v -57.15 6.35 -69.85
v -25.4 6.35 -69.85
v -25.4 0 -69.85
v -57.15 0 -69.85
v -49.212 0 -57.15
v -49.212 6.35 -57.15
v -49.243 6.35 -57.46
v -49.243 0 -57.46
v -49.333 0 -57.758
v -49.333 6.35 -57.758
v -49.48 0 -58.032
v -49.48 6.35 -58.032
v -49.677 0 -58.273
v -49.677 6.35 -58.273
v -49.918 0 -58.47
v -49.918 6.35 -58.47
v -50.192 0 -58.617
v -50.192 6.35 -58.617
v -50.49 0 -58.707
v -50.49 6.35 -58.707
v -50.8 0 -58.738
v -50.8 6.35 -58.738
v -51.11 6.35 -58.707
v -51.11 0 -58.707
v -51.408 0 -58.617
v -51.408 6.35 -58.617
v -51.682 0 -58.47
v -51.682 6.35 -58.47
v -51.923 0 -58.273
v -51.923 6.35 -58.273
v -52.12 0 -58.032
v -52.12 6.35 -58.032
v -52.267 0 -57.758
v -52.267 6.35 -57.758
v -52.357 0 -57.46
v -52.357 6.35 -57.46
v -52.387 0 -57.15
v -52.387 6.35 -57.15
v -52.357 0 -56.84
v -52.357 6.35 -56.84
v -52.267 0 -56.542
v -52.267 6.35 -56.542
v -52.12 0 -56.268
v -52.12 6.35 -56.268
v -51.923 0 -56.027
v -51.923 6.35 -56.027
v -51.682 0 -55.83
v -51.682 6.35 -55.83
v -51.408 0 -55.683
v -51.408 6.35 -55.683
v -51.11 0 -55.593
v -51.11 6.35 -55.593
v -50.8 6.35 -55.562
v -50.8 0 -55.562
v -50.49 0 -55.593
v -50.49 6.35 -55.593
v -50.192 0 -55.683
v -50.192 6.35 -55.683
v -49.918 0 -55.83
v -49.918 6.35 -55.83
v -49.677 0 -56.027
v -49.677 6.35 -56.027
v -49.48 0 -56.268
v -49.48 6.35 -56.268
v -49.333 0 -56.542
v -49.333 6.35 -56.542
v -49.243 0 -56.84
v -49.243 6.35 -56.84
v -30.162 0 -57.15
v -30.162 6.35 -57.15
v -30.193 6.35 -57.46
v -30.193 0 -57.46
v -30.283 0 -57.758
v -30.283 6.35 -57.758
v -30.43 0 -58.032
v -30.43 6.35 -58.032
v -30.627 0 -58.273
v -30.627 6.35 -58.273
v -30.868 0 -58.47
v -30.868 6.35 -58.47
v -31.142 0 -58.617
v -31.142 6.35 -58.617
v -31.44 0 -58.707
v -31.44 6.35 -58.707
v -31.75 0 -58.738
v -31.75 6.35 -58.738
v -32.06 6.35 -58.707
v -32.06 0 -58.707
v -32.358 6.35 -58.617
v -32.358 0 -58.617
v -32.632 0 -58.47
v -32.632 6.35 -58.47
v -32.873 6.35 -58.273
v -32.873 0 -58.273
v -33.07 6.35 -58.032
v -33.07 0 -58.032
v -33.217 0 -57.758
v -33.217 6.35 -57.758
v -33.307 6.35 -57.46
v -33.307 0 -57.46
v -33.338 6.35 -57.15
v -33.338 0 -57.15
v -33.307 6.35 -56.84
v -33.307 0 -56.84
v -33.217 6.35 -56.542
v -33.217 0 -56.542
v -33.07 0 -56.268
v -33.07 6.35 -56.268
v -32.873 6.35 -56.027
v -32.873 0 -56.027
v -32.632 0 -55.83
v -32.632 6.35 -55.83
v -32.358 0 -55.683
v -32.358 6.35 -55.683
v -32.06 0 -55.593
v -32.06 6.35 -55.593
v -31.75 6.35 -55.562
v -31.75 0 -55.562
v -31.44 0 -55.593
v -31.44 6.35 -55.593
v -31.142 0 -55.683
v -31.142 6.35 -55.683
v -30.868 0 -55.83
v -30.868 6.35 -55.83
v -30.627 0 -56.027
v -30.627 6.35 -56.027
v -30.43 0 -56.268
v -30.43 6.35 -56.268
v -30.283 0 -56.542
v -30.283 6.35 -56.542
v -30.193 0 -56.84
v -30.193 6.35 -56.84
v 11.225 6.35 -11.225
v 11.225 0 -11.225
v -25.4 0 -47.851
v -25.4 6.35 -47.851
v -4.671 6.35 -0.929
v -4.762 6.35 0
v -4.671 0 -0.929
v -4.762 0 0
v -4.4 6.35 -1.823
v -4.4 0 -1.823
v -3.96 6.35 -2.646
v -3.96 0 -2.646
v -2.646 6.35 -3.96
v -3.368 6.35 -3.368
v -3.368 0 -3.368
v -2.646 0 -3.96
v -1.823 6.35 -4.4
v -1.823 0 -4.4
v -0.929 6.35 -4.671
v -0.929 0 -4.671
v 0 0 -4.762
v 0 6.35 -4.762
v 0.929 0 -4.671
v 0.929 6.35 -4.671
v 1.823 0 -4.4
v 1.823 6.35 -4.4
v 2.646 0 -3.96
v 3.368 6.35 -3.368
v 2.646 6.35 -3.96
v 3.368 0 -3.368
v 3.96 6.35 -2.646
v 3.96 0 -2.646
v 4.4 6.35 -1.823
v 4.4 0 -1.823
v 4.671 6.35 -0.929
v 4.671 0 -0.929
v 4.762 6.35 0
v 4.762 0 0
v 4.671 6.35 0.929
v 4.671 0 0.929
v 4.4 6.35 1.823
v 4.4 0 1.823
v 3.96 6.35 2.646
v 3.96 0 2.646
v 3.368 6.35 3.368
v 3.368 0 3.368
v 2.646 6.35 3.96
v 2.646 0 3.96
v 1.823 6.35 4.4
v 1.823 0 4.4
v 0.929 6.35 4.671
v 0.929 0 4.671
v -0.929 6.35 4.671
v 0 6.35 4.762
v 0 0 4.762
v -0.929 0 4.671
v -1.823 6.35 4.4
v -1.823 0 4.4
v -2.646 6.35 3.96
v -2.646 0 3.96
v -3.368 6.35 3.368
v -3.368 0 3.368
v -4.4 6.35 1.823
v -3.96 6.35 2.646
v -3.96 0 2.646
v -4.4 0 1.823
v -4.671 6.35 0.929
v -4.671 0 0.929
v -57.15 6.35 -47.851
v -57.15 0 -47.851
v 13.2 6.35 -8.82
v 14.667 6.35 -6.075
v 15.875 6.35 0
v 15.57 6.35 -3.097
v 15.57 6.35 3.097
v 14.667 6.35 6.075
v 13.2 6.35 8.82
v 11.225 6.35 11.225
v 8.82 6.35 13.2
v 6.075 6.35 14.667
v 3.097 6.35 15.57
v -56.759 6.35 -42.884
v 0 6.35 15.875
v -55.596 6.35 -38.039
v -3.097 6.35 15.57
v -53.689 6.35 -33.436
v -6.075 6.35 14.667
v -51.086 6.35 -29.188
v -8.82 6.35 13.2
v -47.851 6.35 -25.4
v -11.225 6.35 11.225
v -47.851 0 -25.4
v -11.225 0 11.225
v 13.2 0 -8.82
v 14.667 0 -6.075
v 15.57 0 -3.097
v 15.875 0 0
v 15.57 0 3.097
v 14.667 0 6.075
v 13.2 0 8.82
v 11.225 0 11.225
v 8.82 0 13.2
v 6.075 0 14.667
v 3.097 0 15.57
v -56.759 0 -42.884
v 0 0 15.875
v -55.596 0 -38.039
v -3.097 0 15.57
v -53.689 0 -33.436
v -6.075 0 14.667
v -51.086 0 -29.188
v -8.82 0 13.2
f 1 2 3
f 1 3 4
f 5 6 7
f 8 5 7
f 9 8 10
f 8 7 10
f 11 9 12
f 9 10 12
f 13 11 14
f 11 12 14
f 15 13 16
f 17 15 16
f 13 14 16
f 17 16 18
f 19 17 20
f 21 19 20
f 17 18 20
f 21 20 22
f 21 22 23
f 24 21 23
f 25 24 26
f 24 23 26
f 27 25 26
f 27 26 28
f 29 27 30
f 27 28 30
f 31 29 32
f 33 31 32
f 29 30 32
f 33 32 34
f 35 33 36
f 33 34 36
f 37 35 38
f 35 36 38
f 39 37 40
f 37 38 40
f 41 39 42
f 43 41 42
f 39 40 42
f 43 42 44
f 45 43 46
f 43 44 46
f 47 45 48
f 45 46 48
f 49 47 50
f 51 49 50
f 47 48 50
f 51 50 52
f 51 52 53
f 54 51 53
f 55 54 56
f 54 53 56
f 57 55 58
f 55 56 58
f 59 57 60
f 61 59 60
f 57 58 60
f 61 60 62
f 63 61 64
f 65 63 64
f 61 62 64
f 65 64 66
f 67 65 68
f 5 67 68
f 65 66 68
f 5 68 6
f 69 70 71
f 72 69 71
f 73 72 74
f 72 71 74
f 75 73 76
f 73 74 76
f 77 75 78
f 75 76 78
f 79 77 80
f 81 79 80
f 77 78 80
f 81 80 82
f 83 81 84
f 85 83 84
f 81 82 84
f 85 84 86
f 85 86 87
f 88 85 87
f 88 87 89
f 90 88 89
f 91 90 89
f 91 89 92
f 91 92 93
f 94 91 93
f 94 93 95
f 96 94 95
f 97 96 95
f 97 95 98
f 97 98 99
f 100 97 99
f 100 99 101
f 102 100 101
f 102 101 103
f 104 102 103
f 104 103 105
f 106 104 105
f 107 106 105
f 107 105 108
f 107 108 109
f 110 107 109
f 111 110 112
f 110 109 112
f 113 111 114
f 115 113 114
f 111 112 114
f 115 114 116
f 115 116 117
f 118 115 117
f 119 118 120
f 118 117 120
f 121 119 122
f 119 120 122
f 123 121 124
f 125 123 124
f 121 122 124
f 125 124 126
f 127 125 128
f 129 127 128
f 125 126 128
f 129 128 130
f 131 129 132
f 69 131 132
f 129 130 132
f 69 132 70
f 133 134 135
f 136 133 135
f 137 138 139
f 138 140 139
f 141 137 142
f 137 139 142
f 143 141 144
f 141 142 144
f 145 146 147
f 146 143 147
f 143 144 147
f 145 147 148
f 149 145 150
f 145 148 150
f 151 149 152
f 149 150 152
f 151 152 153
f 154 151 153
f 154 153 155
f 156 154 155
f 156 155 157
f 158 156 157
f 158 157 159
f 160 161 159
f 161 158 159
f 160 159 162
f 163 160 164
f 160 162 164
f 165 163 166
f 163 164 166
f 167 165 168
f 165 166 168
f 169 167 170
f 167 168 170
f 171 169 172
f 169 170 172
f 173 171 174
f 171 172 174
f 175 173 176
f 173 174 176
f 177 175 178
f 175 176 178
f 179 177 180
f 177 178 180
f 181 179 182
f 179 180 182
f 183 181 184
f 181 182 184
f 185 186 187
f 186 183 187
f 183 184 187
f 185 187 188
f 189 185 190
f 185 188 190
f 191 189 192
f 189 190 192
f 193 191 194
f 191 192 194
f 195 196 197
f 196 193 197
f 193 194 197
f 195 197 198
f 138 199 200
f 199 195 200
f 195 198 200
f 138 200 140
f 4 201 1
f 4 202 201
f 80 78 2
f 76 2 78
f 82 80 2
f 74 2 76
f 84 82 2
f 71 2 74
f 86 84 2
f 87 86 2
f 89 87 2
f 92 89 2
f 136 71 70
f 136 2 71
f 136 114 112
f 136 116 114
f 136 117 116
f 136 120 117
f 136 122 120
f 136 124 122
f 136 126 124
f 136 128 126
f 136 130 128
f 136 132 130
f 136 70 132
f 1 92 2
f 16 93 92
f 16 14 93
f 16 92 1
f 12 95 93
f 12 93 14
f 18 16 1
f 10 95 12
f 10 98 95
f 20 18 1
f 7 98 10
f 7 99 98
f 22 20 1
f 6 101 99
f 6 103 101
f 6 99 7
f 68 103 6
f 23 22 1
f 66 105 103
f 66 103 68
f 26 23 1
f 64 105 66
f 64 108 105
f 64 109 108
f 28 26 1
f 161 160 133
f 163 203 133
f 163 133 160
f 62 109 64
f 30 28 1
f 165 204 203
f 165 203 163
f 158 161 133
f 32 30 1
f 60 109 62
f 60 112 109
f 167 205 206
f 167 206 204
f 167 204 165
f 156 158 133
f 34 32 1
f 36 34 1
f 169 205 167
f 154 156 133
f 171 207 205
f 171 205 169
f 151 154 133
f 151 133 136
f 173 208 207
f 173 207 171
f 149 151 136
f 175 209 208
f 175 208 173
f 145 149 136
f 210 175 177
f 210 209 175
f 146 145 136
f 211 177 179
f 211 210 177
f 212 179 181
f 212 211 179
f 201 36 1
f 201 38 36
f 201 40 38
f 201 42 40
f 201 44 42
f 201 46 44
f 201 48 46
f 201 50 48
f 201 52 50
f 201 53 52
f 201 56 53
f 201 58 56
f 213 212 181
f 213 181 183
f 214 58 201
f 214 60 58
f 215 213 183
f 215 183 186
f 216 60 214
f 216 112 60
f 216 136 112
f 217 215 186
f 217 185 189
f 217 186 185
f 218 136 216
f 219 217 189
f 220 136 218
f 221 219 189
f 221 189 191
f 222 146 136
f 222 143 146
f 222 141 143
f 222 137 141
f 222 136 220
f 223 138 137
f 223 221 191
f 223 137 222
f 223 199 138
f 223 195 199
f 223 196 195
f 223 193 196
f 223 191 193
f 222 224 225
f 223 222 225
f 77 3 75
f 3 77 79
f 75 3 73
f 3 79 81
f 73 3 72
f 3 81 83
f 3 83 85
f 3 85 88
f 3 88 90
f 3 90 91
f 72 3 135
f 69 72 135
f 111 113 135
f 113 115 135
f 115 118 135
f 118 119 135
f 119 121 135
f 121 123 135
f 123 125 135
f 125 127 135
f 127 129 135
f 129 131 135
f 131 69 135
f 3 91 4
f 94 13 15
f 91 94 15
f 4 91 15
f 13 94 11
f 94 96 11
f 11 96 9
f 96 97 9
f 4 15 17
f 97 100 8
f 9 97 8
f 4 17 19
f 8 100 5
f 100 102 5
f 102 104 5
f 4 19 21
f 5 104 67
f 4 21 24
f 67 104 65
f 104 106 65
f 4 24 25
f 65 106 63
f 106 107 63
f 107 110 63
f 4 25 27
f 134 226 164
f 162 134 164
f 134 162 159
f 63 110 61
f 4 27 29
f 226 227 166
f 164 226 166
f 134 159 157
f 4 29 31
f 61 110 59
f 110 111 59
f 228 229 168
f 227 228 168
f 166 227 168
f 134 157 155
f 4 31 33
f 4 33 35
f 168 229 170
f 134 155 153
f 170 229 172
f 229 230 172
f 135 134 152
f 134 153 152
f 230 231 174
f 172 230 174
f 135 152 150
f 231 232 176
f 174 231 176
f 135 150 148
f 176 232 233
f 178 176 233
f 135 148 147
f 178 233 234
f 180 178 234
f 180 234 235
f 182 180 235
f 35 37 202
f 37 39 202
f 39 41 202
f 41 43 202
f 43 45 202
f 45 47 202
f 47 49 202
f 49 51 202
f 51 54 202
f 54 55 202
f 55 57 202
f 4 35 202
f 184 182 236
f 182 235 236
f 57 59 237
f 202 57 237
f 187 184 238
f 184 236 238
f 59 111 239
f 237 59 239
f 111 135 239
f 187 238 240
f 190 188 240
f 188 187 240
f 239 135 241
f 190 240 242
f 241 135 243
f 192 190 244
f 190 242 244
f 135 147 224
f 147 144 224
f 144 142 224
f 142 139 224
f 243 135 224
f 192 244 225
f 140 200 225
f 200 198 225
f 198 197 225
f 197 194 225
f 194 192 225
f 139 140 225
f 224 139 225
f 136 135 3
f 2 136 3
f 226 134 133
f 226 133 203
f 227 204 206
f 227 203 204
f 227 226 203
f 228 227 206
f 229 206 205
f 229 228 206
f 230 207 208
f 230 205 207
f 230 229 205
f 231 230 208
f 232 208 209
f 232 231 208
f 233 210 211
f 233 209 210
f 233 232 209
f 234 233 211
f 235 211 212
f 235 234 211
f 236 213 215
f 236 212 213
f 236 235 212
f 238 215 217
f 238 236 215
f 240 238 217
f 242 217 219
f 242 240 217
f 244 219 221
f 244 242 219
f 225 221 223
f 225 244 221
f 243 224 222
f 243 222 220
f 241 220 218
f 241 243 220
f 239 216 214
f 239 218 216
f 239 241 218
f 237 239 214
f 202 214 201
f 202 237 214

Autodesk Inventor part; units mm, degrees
ref_plane "YZ Plane" through (0, 0, 0) normal (1, 0, 0) x (0, 1, 0)
ref_plane "XZ Plane" through (0, 0, 0) normal (0, 1, 0) x (-1, 0, 0)
ref_plane "XY Plane" through (0, 0, 0) normal (0, 0, 1) x (1, 0, 0)
sketch "Sketch1" plane through (0, 0, 0) normal (0, 1, 0) x (-1, 0, 0)
  circle A0 centre (0, 0) radius 4.7625
  line L0 (0, -228.6) -> (0, 0) construction
  line L1 (15.875, -228.6) -> (0, -228.6) construction
  circle A1 centre (15.875, -228.6) radius 7.9375
  line L2 (25.4, -47.8506) -> (25.4, -212.725)
  line L3 (57.15, -47.8506) -> (57.15, -212.725)
  line L4 (25.4, -212.725) -> (15.875, -212.725)
  arc A2 (15.875, -212.725) -> (15.875, -244.475) centre (15.875, -228.6) ccw
  line L5 (15.875, -244.475) -> (25.4, -244.475)
  arc A3 (25.4, -244.475) -> (57.15, -212.725) centre (25.4, -212.725) ccw
  line L6 (57.15, -130.2878) -> (25.4, -130.2878) construction
  arc A4 (11.2253, 11.2253) -> (-11.2253, -11.2253) centre (0, 0) ccw
  line L7 (-11.2253, -11.2253) -> (25.4, -47.8506)
  arc A5 (57.15, -47.8506) -> (47.8506, -25.4) centre (25.4, -47.8506) ccw
  line L8 (47.8506, -25.4) -> (11.2253, 11.2253)
  line L9 (41.275, -130.2878) -> (41.275, -240.2213) construction
  line L10 (41.275, -130.2878) -> (41.275, -18.8244) construction
  dimension "d0" = 9.525
  dimension "d2" = 228.6
  dimension "d7" = 15.875
  dimension "d17" = 31.75
  dimension "d18" = 45
  dimension "d19" = 25.4
  dimension "d20" = 25.4
extrude "Extrusion1" add sketch "Sketch1" along normal blind 6.35
sketch "Sketch2" plane through (0, 6.35, 0) normal (0, 1, 0) x (1, 0, 0)
  line L0 (-69.0057, 276.0917) -> (22.485, 276.0917)
  line L1 (22.485, 276.0917) -> (22.485, 69.85)
  line L2 (22.485, 69.85) -> (-69.0057, 69.85)
  line L3 (-69.0057, 69.85) -> (-69.0057, 276.0917)
  point P0 (0, 0)
  dimension "d21" = 69.85
extrude "Extrusion2" cut sketch "Sketch2" against normal through all
sketch "Sketch3" plane through (0, 6.35, 0) normal (0, 1, 0) x (1, 0, 0)
  line L0 (-25.4, 47.8506) -> (-25.4, 69.85) construction
  line L1 (-25.4, 47.8506) -> (-25.4, 69.85) construction
  line L2 (-25.4, 57.15) -> (-57.15, 57.15) construction
  line L3 (-25.4, 69.85) -> (-57.15, 69.85) construction
  line L4 (-41.275, 69.85) -> (-41.275, 57.15) construction
  circle A0 centre (-50.8, 57.15) radius 1.5875
  circle A1 centre (-31.75, 57.15) radius 1.5875
  point P0 (0, 0)
  dimension "d24" = 12.7
  dimension "d26" = 3.175
  dimension "d27" = 19.05
extrude "Extrusion3" cut sketch "Sketch3" against normal through all
properties part number "Cross Arms"
